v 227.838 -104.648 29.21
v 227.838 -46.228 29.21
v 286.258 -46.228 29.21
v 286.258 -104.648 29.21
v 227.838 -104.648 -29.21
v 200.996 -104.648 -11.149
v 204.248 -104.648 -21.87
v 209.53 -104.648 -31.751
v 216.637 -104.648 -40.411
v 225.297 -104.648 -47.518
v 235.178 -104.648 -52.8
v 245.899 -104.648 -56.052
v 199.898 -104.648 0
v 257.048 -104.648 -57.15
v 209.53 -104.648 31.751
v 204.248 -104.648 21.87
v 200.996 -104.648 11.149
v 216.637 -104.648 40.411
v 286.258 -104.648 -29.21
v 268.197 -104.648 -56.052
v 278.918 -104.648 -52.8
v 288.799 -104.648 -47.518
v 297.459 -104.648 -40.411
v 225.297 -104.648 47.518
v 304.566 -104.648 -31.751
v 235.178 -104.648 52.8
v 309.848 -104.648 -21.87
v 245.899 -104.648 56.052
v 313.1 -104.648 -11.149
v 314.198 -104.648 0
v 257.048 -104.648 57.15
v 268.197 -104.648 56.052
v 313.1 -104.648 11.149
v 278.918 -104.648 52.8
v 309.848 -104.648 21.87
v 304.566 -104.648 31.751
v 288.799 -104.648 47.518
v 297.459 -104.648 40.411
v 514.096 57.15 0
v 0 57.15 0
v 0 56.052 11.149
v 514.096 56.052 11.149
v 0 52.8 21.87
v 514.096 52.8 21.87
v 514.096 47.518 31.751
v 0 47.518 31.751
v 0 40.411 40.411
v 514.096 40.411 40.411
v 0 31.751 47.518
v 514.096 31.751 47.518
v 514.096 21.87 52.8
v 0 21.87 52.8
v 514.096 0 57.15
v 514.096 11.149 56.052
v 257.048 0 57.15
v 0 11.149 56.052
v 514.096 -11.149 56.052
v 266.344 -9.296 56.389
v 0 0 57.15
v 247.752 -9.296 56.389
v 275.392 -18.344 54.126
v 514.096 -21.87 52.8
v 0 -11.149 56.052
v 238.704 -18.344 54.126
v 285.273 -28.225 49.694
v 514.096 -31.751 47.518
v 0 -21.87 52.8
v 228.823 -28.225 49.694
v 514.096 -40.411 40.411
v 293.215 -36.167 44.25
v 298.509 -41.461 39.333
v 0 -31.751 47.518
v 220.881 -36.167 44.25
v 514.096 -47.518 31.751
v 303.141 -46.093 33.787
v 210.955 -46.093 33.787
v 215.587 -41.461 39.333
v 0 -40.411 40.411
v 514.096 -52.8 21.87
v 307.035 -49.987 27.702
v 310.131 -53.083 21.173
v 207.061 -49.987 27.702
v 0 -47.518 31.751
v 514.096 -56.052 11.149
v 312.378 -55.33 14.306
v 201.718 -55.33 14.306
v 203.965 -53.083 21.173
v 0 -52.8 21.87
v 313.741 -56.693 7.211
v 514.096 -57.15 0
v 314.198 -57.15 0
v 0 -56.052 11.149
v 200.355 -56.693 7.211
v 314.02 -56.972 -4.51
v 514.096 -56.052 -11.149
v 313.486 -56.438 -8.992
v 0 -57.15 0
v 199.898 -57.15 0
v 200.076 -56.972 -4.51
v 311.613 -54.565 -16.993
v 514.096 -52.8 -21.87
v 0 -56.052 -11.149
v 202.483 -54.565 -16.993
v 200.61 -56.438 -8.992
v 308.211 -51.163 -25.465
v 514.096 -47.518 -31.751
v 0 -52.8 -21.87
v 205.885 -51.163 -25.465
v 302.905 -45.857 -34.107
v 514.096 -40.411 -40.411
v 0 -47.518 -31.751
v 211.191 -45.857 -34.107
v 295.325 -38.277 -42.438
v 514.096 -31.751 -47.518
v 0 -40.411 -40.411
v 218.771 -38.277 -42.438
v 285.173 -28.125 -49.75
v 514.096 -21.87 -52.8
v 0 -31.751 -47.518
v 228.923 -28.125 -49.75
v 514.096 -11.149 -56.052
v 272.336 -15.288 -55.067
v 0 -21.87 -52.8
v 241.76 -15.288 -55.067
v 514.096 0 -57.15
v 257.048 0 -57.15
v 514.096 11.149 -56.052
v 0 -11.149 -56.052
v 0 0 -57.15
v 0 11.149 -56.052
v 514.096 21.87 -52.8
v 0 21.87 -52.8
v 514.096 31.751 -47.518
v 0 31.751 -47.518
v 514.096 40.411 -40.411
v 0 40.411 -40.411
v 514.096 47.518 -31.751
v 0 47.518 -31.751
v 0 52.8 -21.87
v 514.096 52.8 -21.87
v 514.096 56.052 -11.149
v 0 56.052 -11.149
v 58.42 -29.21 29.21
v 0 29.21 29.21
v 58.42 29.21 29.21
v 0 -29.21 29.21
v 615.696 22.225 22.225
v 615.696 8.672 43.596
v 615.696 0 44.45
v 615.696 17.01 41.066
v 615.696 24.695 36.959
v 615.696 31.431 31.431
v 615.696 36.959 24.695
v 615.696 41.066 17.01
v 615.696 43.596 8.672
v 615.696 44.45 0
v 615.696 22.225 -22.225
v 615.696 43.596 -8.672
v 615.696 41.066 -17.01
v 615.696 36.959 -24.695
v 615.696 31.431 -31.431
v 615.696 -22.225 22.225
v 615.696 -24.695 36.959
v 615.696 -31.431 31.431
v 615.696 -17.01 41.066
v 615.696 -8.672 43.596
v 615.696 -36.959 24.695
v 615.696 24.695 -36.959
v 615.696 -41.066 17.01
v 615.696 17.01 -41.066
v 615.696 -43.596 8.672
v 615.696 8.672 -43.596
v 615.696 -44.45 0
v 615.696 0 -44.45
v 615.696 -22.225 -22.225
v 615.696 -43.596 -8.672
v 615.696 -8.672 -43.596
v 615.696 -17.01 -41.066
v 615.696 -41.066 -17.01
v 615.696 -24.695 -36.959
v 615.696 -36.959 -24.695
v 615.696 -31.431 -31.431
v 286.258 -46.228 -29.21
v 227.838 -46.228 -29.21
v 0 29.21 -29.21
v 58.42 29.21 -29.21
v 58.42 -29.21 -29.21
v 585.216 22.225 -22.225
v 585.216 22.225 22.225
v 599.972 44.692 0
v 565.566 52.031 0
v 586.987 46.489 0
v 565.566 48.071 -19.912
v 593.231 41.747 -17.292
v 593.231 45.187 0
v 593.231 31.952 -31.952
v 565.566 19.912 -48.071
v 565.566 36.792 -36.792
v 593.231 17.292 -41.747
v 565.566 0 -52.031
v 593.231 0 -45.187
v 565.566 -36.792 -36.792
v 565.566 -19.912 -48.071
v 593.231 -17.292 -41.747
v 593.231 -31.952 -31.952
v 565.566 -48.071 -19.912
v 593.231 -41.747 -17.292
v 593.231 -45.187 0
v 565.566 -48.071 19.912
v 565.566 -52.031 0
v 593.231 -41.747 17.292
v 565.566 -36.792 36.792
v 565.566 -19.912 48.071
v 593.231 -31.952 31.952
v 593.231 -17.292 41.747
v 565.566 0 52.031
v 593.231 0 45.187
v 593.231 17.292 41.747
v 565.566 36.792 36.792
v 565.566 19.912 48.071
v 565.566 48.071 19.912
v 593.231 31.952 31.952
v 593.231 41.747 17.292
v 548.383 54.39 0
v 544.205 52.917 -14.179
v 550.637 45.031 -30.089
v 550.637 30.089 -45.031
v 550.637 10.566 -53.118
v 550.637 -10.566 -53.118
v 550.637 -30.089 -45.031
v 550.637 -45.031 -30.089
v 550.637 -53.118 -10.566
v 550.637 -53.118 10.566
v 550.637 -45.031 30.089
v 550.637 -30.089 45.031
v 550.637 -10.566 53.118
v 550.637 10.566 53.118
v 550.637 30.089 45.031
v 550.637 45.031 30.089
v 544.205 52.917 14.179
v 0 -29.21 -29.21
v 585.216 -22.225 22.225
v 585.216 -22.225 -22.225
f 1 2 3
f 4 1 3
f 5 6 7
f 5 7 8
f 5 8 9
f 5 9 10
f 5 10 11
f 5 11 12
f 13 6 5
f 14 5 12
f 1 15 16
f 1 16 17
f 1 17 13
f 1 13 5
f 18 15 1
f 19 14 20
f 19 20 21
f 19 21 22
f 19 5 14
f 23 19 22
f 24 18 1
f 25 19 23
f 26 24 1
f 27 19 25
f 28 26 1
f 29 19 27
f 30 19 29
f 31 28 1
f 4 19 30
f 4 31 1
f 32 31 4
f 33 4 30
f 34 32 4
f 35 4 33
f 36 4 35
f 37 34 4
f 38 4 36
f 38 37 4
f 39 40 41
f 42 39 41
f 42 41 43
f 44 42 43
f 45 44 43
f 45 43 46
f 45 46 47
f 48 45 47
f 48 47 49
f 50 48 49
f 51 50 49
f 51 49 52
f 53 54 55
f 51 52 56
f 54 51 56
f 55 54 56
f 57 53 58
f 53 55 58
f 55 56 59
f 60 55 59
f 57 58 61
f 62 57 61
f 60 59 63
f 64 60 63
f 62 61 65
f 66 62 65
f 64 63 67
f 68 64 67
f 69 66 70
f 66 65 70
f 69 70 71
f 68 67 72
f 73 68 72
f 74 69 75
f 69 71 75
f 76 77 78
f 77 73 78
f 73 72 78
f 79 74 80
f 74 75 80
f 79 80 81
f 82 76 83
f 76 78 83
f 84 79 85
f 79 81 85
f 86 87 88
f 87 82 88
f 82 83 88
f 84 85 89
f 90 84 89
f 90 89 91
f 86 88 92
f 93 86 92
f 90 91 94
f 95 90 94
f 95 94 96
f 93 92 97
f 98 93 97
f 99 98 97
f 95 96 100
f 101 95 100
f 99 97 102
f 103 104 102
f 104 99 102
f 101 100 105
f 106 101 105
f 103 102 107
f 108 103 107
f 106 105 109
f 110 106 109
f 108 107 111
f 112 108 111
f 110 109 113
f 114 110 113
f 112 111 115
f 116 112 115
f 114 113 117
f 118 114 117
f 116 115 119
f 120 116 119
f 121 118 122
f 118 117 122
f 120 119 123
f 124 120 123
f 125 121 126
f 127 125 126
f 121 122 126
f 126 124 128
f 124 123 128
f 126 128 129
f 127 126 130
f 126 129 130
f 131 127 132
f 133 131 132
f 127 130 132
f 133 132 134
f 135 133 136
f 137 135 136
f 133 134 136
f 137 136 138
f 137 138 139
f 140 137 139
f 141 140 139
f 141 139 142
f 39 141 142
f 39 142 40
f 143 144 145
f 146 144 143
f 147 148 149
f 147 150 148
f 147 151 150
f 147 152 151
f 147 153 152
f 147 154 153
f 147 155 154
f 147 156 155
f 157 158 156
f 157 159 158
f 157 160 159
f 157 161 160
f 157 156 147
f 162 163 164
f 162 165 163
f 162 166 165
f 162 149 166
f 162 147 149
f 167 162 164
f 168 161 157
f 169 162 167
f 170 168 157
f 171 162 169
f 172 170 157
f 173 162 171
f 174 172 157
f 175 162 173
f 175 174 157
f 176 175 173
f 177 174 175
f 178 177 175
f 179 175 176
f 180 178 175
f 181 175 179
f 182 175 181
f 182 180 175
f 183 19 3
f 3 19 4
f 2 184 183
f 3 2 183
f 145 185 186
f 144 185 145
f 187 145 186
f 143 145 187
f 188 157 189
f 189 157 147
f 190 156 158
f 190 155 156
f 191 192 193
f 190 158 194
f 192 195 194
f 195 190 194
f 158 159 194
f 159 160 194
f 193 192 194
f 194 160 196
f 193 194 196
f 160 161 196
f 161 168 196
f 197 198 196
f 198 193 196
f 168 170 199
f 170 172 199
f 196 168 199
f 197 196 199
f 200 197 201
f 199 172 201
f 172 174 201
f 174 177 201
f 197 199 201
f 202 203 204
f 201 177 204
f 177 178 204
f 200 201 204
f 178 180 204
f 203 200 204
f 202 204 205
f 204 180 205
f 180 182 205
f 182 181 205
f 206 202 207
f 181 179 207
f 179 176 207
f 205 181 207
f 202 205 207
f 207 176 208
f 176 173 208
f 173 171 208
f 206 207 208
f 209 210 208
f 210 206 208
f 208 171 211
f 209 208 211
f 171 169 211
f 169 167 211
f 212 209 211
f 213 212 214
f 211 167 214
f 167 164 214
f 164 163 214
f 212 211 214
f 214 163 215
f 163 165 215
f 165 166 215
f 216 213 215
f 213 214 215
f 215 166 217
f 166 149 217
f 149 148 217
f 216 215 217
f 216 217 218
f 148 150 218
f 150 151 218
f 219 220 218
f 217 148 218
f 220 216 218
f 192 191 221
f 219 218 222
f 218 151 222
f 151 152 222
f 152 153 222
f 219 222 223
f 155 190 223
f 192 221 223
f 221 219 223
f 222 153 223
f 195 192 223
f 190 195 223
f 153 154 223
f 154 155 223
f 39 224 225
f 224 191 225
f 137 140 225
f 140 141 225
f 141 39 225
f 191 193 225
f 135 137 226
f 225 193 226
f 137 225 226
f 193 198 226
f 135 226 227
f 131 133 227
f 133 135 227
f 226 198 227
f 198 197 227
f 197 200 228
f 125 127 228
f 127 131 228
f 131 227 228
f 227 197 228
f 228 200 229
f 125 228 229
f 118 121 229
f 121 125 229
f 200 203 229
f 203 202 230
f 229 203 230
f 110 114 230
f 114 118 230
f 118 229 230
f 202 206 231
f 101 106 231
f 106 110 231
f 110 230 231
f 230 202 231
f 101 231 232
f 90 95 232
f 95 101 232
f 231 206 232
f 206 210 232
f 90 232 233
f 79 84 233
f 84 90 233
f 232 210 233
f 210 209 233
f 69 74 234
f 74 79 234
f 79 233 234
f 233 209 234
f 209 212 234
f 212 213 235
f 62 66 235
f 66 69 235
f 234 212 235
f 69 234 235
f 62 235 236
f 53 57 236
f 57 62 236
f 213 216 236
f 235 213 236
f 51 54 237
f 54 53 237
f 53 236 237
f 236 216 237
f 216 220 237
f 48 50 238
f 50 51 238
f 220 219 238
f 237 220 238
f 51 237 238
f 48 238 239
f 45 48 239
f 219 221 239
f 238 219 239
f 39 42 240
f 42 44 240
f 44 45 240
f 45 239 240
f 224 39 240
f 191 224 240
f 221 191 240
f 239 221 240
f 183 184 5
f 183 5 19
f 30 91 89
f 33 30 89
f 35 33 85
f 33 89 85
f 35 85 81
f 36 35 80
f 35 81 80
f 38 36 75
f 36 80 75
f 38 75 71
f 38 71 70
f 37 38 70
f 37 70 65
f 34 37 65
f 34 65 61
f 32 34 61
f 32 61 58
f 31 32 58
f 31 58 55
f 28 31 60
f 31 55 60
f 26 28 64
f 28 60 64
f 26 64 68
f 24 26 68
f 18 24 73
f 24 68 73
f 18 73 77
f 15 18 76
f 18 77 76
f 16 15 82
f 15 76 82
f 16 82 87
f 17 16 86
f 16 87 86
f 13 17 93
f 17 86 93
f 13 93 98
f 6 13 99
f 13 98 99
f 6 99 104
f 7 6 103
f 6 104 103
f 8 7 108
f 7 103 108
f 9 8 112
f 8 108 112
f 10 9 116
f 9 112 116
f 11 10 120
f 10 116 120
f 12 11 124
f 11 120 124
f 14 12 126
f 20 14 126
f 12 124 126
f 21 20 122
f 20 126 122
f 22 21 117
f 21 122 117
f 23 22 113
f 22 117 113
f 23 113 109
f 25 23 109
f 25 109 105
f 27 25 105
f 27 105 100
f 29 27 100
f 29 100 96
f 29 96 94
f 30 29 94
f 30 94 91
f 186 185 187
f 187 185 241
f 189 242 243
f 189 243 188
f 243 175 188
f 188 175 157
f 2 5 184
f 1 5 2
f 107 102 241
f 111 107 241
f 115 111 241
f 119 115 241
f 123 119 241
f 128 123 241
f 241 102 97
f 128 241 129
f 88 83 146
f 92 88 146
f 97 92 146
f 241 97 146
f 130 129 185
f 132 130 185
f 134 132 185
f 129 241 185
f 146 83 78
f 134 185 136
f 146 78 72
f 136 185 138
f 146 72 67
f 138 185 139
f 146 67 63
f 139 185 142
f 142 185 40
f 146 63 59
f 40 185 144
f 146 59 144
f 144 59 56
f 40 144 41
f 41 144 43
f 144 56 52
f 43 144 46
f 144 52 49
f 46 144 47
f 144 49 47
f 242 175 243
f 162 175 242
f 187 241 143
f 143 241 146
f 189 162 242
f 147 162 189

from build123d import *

# Parameters (mm, degrees)
F0_R      = 57.15
F3_DEPTH  = 514.096
F2_R      = 57.15
F5_DEPTH  = 104.648
F6_W      = 58.42
F6_H      = 58.42
F7_DEPTH  = 58.42
F8_W      = 58.42
F8_H      = 58.42
F9_DEPTH  = 58.42
F10_W     = 44.45
F10_H     = 44.45
F11_DEPTH = 30.48


# Not quite as in the source:
# - a feature names something its author has since deleted; it is built from what else it names


with BuildPart() as f3:
    # F0 (on Right) → F3 (new body)
    with BuildSketch(Plane.YZ):
        Circle(F0_R)
    extrude(amount=F3_DEPTH)

    # F1 (on Top) → F4 (revolve)
    with BuildSketch(Plane.XY):
        with BuildLine():
            Line((514.096, 57.15), (514.096, 0))
            Line((514.096, 0), (615.696, 0))
            Line((615.696, 0), (615.696, 44.45))
            add(Edge.make_bspline(
                [(514.096, 57.15), (530.3059150596, 55.8042351211), (558.1923144484, 54.3135523686), (580.3852464856, 48.6501982027), (594.1085406783, 43.9680323111), (608.3163207178, 44.8236773325), (615.696, 44.45)],
                knots=[0, 0, 0, 0, 0.3407026007, 0.5771106283, 0.7657914869, 1, 1, 1, 1], degree=3))
        make_face()
    revolve(axis=Axis((564.896, 0, 0), (-1, 0, 0)))

    # F2 (on Front) → F5 (join)
    with BuildSketch(Plane.XZ):
        with Locations((257.048, 0)):
            Circle(F2_R)
    extrude(amount=F5_DEPTH)

    # F6 (on face) → F7 (cut)
    with BuildSketch(Plane(origin=(0, 0, 0), x_dir=(0, -1, 0), z_dir=(-1, 0, 0))):
        Rectangle(F6_W, F6_H)
    extrude(amount=-F7_DEPTH, mode=Mode.SUBTRACT)

    # F8 (on face) → F9 (cut)
    with BuildSketch(Plane.XZ.offset(104.648)):
        with Locations((257.048, 0)):
            Rectangle(F8_W, F8_H)
    extrude(amount=-F9_DEPTH, mode=Mode.SUBTRACT)

    # F10 (on face) → F11 (cut)
    with BuildSketch(Plane.YZ.offset(615.696)):
        Rectangle(F10_W, F10_H)
    extrude(amount=-F11_DEPTH, mode=Mode.SUBTRACT)


solid = f3.part
